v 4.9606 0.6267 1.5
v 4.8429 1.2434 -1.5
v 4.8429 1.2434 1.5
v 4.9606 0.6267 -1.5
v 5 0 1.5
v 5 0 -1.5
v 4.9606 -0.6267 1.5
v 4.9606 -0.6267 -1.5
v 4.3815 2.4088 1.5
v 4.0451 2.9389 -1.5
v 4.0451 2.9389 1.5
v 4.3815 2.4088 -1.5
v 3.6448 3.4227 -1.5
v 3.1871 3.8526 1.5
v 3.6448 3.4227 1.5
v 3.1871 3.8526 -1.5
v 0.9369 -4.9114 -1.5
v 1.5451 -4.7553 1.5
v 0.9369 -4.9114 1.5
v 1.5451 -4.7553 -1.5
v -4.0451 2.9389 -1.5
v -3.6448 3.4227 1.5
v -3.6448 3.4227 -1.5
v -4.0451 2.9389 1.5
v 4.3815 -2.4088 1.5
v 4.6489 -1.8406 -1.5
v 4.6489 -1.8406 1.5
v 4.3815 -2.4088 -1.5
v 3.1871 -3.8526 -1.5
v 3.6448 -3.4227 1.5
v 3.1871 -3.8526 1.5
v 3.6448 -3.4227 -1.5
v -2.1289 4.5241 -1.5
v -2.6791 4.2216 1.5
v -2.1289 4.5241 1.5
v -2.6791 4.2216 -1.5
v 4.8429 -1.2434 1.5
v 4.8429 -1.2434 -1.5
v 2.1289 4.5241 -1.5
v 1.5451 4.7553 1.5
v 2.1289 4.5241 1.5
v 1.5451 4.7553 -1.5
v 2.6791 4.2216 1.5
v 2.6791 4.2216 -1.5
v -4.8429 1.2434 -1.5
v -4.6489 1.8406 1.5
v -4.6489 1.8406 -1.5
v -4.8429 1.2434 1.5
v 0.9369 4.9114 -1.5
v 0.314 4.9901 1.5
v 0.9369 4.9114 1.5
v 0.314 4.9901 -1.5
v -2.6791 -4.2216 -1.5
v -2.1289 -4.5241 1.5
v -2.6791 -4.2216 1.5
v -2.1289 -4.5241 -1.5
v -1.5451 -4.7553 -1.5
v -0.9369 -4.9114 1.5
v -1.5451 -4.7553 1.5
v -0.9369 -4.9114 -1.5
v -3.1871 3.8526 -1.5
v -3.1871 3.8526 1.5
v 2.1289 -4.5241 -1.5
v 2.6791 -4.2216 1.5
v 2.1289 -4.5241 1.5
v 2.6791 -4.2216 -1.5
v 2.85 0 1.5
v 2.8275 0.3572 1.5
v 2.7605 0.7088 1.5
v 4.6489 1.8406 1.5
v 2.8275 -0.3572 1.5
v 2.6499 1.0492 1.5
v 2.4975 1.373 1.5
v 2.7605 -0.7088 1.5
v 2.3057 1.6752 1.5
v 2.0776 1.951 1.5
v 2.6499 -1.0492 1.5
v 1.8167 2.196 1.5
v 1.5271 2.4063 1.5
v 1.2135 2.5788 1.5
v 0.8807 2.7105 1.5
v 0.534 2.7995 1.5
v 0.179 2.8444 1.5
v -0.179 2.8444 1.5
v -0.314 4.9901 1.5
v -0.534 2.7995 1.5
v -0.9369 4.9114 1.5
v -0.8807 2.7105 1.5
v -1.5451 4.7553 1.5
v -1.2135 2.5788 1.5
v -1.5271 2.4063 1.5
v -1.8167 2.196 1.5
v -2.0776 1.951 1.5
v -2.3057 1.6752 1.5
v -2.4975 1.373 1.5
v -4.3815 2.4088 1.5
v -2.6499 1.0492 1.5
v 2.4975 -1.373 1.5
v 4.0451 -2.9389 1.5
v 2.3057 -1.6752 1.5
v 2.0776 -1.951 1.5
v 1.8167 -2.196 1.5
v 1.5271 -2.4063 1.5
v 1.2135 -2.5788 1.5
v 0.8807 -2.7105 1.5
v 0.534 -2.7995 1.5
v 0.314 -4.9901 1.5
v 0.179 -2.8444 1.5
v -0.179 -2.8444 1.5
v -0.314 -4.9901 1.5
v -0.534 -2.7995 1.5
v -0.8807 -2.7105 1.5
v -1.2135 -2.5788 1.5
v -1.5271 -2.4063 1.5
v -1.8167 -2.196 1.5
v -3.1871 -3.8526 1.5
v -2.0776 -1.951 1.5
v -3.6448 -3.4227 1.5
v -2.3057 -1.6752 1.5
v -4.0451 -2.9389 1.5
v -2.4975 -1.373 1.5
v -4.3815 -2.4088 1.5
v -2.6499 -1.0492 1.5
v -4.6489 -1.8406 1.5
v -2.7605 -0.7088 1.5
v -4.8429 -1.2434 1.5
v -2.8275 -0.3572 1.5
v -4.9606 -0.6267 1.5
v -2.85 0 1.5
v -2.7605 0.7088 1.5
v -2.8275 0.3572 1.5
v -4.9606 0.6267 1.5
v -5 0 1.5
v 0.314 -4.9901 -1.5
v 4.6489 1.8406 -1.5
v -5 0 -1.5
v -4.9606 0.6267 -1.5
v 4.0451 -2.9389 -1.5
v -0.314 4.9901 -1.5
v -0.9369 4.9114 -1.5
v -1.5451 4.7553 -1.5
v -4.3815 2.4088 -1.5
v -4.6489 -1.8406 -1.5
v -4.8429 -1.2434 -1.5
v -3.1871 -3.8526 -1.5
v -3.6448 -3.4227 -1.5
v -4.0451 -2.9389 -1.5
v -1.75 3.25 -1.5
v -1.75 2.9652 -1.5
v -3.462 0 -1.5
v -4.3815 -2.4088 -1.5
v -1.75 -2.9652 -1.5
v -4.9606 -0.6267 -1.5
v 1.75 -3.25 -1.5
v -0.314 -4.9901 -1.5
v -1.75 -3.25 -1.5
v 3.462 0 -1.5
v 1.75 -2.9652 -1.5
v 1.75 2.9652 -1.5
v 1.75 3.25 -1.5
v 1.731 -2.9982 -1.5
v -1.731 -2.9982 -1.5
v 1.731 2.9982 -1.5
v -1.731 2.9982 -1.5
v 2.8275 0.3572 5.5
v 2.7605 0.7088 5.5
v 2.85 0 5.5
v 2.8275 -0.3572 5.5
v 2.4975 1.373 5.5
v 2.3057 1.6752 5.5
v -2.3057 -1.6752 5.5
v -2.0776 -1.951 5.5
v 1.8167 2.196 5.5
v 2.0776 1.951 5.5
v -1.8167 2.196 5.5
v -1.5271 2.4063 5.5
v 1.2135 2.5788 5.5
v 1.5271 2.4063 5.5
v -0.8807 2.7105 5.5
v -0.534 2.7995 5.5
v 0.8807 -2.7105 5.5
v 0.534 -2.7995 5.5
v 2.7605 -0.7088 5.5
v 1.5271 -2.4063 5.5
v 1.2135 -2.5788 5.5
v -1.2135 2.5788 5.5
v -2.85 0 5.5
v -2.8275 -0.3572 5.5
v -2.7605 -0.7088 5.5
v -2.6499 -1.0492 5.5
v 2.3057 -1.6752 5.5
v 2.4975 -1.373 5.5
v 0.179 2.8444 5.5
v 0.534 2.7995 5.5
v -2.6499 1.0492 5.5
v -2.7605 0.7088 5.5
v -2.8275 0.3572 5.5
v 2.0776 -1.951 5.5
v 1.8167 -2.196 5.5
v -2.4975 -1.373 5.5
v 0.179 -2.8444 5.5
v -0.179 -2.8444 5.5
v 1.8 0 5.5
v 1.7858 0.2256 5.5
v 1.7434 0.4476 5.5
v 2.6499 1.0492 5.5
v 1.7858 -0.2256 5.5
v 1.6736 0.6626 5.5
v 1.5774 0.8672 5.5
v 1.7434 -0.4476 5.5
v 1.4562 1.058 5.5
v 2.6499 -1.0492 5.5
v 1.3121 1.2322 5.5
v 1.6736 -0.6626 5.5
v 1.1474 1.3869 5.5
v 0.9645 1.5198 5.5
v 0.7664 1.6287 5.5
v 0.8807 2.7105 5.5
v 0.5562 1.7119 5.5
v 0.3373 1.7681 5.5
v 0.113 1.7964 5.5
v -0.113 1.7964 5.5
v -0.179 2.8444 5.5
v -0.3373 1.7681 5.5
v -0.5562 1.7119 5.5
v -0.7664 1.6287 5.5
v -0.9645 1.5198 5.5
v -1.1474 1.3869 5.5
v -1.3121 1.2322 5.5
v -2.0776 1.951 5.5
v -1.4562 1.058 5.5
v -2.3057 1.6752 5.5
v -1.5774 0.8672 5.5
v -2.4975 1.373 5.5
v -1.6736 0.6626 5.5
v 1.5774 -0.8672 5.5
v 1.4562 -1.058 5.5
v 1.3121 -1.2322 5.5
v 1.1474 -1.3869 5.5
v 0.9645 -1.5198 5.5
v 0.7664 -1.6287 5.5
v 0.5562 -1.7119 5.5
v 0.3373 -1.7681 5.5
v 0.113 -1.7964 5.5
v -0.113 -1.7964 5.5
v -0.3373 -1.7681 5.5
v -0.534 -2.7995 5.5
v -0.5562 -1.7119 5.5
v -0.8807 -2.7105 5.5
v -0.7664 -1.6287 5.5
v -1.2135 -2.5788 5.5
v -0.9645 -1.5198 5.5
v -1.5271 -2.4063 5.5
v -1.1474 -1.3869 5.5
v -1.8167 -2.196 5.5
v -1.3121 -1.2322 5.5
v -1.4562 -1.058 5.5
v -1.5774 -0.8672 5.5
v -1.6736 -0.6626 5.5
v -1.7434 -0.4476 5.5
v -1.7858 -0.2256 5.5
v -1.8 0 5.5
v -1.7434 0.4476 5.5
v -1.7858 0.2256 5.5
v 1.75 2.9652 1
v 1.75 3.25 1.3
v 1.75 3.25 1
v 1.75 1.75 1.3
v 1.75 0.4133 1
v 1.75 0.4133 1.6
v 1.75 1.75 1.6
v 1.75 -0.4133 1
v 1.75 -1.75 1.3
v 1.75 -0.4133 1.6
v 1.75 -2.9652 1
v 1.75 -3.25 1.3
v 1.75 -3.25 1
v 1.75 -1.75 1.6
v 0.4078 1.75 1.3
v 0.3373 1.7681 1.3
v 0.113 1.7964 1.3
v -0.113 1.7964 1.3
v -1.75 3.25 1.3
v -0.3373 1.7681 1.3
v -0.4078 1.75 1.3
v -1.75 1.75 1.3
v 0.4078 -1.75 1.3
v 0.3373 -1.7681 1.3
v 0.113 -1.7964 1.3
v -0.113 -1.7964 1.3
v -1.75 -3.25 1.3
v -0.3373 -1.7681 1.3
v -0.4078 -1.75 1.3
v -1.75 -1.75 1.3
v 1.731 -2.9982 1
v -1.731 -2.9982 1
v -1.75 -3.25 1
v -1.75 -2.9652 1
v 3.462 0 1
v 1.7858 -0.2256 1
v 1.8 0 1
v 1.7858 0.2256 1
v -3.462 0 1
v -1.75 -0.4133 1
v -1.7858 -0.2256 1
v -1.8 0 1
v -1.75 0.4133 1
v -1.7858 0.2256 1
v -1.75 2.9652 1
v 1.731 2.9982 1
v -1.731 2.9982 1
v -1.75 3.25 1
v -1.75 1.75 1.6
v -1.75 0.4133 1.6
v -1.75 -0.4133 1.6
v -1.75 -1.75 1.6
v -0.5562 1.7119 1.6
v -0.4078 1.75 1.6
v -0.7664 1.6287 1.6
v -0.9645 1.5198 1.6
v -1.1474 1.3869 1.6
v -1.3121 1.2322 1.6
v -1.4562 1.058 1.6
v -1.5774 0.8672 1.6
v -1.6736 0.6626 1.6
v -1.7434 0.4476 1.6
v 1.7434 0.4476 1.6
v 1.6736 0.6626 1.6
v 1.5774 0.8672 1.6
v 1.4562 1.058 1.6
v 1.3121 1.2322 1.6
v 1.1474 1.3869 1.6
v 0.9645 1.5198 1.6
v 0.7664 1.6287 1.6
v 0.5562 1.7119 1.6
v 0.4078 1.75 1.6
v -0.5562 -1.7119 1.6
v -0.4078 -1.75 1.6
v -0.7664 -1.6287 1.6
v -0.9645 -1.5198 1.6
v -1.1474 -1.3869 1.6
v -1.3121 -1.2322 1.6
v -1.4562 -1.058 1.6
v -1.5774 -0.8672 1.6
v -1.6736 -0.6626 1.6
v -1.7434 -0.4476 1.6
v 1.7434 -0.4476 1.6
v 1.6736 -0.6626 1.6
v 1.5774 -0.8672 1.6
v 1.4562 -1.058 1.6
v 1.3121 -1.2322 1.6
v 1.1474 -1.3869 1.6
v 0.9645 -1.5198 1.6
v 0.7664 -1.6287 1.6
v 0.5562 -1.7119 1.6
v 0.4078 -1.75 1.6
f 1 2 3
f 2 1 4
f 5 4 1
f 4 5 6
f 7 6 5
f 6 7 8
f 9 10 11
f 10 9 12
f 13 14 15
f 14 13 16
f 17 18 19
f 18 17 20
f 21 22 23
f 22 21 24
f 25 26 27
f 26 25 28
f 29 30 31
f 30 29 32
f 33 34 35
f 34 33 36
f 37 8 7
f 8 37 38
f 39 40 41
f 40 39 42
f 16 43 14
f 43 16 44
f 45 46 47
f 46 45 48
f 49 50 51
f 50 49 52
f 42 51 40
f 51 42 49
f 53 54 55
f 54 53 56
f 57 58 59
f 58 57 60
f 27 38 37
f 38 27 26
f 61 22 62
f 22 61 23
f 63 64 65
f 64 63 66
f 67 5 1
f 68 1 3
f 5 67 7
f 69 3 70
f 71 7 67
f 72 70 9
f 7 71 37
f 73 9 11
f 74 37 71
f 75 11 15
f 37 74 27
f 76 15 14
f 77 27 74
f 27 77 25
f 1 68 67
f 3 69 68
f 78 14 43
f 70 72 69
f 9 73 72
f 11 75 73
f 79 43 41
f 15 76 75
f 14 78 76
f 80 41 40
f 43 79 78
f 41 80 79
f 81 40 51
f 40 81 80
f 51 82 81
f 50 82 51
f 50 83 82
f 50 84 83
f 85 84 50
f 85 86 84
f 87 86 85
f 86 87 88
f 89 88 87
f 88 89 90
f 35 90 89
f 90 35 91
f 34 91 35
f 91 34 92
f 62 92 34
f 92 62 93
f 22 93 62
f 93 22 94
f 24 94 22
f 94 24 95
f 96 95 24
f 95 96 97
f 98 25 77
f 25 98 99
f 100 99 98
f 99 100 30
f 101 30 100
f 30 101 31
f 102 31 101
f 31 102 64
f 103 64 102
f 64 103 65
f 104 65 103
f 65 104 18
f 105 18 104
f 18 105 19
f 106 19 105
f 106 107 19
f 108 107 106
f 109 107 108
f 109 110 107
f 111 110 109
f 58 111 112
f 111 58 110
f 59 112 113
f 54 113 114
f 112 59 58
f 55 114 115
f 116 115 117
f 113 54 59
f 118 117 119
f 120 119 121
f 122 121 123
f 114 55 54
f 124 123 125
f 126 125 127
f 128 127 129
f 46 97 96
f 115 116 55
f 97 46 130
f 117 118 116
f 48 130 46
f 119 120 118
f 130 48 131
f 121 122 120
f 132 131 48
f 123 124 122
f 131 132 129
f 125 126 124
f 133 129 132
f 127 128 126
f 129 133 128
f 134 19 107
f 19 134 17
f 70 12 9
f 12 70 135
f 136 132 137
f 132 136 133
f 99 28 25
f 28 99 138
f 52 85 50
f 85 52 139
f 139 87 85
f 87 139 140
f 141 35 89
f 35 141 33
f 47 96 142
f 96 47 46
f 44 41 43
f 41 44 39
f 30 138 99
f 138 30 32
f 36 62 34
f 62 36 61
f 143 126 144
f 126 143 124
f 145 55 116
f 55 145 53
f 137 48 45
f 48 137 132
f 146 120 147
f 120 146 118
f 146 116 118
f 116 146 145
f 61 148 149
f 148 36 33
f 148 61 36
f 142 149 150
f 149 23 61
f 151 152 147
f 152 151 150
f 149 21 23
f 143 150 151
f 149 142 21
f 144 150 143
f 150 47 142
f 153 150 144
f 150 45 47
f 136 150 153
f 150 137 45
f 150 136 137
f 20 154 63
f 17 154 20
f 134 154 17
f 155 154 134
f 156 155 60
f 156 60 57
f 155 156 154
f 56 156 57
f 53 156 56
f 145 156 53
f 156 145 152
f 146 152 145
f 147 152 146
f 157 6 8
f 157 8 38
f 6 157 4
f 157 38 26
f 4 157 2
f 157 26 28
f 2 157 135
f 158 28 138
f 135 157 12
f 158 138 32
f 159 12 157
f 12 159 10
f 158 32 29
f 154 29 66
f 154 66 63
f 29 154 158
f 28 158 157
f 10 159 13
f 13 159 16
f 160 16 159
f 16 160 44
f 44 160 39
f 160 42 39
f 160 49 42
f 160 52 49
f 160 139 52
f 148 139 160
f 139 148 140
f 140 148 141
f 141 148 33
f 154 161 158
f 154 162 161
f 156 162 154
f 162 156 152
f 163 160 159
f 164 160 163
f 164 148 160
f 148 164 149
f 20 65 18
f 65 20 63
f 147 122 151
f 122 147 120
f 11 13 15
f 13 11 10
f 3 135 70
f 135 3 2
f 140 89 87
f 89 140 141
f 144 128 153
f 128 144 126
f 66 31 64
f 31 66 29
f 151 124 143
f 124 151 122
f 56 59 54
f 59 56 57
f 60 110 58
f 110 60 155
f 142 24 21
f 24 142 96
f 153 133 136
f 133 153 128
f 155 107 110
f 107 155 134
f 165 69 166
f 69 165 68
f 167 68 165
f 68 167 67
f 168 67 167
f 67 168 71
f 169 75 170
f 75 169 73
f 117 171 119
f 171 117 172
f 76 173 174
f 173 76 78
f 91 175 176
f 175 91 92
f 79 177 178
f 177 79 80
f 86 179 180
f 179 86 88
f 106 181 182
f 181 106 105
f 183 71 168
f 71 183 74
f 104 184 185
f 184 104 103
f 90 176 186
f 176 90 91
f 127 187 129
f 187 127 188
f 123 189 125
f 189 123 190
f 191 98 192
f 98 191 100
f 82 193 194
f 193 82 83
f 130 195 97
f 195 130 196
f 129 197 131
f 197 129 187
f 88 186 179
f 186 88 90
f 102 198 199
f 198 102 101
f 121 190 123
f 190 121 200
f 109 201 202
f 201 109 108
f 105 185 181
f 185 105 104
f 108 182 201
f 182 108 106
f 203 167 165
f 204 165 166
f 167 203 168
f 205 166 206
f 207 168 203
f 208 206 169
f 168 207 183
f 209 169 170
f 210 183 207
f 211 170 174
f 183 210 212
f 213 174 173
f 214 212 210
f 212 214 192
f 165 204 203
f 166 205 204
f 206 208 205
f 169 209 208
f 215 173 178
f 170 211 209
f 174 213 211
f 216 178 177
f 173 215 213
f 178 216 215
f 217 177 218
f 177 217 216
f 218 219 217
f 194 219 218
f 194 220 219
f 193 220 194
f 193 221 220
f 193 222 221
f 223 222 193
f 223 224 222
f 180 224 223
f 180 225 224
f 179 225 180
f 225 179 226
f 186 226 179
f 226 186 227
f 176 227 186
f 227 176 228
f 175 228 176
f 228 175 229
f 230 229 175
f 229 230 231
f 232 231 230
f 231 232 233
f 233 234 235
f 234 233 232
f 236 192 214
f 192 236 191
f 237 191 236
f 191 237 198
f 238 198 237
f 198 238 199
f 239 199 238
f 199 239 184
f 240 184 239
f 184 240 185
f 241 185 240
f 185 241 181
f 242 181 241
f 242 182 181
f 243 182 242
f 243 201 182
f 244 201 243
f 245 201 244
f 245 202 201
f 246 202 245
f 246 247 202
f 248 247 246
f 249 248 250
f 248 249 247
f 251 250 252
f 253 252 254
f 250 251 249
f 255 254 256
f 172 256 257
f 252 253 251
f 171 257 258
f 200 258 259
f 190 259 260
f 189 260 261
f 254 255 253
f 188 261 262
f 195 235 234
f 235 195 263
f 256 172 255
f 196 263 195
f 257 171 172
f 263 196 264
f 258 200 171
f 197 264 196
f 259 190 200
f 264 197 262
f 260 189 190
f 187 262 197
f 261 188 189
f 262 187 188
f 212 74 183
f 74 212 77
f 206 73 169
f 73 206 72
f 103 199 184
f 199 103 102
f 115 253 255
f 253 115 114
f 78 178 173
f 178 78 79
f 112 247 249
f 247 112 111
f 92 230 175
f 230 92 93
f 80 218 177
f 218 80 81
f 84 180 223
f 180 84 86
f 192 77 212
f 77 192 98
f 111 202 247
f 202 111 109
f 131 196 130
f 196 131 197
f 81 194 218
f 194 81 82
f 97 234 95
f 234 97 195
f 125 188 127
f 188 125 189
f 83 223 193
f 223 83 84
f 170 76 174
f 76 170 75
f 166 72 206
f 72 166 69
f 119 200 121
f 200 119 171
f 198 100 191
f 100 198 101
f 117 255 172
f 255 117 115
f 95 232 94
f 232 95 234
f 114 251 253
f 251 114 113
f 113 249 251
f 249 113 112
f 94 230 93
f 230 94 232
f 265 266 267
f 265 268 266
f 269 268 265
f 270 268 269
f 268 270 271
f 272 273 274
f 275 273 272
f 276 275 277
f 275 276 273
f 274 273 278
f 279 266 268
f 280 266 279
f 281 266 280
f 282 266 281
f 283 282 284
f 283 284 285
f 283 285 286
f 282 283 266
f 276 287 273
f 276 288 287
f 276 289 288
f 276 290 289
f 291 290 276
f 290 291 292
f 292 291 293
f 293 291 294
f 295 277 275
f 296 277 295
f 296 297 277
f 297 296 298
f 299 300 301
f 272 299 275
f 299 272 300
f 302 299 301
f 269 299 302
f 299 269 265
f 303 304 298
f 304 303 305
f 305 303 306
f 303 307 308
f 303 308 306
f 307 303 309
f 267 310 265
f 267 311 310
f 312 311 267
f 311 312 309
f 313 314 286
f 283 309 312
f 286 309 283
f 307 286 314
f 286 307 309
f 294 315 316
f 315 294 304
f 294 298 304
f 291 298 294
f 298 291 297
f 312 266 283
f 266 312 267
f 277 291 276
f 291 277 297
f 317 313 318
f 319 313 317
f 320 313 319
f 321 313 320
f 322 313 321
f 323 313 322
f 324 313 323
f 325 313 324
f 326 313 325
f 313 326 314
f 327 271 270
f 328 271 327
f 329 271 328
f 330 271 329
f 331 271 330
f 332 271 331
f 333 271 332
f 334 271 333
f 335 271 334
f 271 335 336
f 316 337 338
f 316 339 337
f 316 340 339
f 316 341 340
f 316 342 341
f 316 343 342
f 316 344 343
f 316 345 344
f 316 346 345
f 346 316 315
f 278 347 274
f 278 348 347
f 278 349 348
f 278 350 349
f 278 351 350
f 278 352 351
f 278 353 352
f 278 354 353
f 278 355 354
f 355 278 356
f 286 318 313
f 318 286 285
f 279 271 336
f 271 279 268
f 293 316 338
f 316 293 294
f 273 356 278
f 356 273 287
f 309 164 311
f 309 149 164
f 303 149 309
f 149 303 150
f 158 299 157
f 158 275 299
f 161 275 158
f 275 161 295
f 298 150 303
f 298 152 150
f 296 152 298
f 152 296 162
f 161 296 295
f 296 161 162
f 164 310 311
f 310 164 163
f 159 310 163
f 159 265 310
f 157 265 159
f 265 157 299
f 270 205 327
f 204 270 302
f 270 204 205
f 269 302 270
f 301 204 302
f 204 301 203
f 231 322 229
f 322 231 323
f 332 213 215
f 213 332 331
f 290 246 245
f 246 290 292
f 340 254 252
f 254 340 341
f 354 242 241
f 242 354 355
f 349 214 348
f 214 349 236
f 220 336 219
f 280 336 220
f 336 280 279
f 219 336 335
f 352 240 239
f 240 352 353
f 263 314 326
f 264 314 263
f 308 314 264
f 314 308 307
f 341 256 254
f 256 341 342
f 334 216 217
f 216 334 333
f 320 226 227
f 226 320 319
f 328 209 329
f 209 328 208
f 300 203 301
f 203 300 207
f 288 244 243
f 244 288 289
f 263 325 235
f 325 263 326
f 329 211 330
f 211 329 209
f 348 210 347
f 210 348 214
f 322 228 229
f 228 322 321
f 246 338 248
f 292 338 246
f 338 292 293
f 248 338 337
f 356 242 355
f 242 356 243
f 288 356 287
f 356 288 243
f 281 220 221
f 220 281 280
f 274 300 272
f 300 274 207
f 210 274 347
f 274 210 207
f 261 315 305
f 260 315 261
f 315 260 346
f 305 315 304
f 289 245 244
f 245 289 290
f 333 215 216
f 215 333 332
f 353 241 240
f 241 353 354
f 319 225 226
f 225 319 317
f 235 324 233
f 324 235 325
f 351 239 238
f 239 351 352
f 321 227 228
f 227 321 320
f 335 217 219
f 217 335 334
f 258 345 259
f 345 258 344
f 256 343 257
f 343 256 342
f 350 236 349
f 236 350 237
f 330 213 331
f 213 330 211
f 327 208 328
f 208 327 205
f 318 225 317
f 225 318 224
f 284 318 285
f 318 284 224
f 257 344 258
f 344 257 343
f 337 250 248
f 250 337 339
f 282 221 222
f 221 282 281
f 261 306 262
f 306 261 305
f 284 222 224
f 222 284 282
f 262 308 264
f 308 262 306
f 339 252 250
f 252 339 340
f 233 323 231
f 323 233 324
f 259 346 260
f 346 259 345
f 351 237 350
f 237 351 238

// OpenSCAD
$fn = 50;


difference() {
	union() {
		translate(v = [0, 0, -1.5000000000]) {
			cylinder(h = 3, r = 5.0000000000);
		}
		translate(v = [0, 0, -1.5000000000]) {
			cylinder(h = 7, r = 2.8500000000);
		}
	}
	union() {
		translate(v = [0, 0, -1.5000000000]) {
			rotate(a = [0, 0, 0]) {
				difference() {
					union() {
						translate(v = [-1.7500000000, -3.2500000000, -0.3000000000]) {
							cube(size = [3.5000000000, 6.5000000000, 0.3000000000]);
						}
						translate(v = [-1.7500000000, -1.7500000000, -0.6000000000]) {
							cube(size = [3.5000000000, 3.5000000000, 0.3000000000]);
						}
						translate(v = [-1.7500000000, -3.2500000000, 2.5000000000]) {
							cube(size = [3.5000000000, 6.5000000000, 0.3000000000]);
						}
						translate(v = [-1.7500000000, -1.7500000000, 2.8000000000]) {
							cube(size = [3.5000000000, 3.5000000000, 0.3000000000]);
						}
						linear_extrude(height = 2.5000000000) {
							polygon(points = [[3.4620000000, 0.0000000000], [1.7310000000, 2.9981799479], [-1.7310000000, 2.9981799479], [-3.4620000000, 0.0000000000], [-1.7310000000, -2.9981799479], [1.7310000000, -2.9981799479]]);
						}
						translate(v = [-1.7500000000, -3.2500000000, -0.3000000000]) {
							cube(size = [3.5000000000, 6.5000000000, 0.3000000000]);
						}
						translate(v = [-1.7500000000, -1.7500000000, -0.6000000000]) {
							cube(size = [3.5000000000, 3.5000000000, 0.3000000000]);
						}
						translate(v = [-1.7500000000, -3.2500000000, 2.5000000000]) {
							cube(size = [3.5000000000, 6.5000000000, 0.3000000000]);
						}
						translate(v = [-1.7500000000, -1.7500000000, 2.8000000000]) {
							cube(size = [3.5000000000, 3.5000000000, 0.3000000000]);
						}
						translate(v = [-1.7500000000, -3.2500000000, -0.3000000000]) {
							cube(size = [3.5000000000, 6.5000000000, 0.3000000000]);
						}
						translate(v = [-1.7500000000, -1.7500000000, -0.6000000000]) {
							cube(size = [3.5000000000, 3.5000000000, 0.3000000000]);
						}
						translate(v = [-1.7500000000, -3.2500000000, 2.5000000000]) {
							cube(size = [3.5000000000, 6.5000000000, 0.3000000000]);
						}
						translate(v = [-1.7500000000, -1.7500000000, 2.8000000000]) {
							cube(size = [3.5000000000, 3.5000000000, 0.3000000000]);
						}
					}
					union();
				}
			}
		}
		translate(v = [0, 0, -100.0000000000]) {
			cylinder(h = 200, r = 1.8000000000);
		}
	}
}
